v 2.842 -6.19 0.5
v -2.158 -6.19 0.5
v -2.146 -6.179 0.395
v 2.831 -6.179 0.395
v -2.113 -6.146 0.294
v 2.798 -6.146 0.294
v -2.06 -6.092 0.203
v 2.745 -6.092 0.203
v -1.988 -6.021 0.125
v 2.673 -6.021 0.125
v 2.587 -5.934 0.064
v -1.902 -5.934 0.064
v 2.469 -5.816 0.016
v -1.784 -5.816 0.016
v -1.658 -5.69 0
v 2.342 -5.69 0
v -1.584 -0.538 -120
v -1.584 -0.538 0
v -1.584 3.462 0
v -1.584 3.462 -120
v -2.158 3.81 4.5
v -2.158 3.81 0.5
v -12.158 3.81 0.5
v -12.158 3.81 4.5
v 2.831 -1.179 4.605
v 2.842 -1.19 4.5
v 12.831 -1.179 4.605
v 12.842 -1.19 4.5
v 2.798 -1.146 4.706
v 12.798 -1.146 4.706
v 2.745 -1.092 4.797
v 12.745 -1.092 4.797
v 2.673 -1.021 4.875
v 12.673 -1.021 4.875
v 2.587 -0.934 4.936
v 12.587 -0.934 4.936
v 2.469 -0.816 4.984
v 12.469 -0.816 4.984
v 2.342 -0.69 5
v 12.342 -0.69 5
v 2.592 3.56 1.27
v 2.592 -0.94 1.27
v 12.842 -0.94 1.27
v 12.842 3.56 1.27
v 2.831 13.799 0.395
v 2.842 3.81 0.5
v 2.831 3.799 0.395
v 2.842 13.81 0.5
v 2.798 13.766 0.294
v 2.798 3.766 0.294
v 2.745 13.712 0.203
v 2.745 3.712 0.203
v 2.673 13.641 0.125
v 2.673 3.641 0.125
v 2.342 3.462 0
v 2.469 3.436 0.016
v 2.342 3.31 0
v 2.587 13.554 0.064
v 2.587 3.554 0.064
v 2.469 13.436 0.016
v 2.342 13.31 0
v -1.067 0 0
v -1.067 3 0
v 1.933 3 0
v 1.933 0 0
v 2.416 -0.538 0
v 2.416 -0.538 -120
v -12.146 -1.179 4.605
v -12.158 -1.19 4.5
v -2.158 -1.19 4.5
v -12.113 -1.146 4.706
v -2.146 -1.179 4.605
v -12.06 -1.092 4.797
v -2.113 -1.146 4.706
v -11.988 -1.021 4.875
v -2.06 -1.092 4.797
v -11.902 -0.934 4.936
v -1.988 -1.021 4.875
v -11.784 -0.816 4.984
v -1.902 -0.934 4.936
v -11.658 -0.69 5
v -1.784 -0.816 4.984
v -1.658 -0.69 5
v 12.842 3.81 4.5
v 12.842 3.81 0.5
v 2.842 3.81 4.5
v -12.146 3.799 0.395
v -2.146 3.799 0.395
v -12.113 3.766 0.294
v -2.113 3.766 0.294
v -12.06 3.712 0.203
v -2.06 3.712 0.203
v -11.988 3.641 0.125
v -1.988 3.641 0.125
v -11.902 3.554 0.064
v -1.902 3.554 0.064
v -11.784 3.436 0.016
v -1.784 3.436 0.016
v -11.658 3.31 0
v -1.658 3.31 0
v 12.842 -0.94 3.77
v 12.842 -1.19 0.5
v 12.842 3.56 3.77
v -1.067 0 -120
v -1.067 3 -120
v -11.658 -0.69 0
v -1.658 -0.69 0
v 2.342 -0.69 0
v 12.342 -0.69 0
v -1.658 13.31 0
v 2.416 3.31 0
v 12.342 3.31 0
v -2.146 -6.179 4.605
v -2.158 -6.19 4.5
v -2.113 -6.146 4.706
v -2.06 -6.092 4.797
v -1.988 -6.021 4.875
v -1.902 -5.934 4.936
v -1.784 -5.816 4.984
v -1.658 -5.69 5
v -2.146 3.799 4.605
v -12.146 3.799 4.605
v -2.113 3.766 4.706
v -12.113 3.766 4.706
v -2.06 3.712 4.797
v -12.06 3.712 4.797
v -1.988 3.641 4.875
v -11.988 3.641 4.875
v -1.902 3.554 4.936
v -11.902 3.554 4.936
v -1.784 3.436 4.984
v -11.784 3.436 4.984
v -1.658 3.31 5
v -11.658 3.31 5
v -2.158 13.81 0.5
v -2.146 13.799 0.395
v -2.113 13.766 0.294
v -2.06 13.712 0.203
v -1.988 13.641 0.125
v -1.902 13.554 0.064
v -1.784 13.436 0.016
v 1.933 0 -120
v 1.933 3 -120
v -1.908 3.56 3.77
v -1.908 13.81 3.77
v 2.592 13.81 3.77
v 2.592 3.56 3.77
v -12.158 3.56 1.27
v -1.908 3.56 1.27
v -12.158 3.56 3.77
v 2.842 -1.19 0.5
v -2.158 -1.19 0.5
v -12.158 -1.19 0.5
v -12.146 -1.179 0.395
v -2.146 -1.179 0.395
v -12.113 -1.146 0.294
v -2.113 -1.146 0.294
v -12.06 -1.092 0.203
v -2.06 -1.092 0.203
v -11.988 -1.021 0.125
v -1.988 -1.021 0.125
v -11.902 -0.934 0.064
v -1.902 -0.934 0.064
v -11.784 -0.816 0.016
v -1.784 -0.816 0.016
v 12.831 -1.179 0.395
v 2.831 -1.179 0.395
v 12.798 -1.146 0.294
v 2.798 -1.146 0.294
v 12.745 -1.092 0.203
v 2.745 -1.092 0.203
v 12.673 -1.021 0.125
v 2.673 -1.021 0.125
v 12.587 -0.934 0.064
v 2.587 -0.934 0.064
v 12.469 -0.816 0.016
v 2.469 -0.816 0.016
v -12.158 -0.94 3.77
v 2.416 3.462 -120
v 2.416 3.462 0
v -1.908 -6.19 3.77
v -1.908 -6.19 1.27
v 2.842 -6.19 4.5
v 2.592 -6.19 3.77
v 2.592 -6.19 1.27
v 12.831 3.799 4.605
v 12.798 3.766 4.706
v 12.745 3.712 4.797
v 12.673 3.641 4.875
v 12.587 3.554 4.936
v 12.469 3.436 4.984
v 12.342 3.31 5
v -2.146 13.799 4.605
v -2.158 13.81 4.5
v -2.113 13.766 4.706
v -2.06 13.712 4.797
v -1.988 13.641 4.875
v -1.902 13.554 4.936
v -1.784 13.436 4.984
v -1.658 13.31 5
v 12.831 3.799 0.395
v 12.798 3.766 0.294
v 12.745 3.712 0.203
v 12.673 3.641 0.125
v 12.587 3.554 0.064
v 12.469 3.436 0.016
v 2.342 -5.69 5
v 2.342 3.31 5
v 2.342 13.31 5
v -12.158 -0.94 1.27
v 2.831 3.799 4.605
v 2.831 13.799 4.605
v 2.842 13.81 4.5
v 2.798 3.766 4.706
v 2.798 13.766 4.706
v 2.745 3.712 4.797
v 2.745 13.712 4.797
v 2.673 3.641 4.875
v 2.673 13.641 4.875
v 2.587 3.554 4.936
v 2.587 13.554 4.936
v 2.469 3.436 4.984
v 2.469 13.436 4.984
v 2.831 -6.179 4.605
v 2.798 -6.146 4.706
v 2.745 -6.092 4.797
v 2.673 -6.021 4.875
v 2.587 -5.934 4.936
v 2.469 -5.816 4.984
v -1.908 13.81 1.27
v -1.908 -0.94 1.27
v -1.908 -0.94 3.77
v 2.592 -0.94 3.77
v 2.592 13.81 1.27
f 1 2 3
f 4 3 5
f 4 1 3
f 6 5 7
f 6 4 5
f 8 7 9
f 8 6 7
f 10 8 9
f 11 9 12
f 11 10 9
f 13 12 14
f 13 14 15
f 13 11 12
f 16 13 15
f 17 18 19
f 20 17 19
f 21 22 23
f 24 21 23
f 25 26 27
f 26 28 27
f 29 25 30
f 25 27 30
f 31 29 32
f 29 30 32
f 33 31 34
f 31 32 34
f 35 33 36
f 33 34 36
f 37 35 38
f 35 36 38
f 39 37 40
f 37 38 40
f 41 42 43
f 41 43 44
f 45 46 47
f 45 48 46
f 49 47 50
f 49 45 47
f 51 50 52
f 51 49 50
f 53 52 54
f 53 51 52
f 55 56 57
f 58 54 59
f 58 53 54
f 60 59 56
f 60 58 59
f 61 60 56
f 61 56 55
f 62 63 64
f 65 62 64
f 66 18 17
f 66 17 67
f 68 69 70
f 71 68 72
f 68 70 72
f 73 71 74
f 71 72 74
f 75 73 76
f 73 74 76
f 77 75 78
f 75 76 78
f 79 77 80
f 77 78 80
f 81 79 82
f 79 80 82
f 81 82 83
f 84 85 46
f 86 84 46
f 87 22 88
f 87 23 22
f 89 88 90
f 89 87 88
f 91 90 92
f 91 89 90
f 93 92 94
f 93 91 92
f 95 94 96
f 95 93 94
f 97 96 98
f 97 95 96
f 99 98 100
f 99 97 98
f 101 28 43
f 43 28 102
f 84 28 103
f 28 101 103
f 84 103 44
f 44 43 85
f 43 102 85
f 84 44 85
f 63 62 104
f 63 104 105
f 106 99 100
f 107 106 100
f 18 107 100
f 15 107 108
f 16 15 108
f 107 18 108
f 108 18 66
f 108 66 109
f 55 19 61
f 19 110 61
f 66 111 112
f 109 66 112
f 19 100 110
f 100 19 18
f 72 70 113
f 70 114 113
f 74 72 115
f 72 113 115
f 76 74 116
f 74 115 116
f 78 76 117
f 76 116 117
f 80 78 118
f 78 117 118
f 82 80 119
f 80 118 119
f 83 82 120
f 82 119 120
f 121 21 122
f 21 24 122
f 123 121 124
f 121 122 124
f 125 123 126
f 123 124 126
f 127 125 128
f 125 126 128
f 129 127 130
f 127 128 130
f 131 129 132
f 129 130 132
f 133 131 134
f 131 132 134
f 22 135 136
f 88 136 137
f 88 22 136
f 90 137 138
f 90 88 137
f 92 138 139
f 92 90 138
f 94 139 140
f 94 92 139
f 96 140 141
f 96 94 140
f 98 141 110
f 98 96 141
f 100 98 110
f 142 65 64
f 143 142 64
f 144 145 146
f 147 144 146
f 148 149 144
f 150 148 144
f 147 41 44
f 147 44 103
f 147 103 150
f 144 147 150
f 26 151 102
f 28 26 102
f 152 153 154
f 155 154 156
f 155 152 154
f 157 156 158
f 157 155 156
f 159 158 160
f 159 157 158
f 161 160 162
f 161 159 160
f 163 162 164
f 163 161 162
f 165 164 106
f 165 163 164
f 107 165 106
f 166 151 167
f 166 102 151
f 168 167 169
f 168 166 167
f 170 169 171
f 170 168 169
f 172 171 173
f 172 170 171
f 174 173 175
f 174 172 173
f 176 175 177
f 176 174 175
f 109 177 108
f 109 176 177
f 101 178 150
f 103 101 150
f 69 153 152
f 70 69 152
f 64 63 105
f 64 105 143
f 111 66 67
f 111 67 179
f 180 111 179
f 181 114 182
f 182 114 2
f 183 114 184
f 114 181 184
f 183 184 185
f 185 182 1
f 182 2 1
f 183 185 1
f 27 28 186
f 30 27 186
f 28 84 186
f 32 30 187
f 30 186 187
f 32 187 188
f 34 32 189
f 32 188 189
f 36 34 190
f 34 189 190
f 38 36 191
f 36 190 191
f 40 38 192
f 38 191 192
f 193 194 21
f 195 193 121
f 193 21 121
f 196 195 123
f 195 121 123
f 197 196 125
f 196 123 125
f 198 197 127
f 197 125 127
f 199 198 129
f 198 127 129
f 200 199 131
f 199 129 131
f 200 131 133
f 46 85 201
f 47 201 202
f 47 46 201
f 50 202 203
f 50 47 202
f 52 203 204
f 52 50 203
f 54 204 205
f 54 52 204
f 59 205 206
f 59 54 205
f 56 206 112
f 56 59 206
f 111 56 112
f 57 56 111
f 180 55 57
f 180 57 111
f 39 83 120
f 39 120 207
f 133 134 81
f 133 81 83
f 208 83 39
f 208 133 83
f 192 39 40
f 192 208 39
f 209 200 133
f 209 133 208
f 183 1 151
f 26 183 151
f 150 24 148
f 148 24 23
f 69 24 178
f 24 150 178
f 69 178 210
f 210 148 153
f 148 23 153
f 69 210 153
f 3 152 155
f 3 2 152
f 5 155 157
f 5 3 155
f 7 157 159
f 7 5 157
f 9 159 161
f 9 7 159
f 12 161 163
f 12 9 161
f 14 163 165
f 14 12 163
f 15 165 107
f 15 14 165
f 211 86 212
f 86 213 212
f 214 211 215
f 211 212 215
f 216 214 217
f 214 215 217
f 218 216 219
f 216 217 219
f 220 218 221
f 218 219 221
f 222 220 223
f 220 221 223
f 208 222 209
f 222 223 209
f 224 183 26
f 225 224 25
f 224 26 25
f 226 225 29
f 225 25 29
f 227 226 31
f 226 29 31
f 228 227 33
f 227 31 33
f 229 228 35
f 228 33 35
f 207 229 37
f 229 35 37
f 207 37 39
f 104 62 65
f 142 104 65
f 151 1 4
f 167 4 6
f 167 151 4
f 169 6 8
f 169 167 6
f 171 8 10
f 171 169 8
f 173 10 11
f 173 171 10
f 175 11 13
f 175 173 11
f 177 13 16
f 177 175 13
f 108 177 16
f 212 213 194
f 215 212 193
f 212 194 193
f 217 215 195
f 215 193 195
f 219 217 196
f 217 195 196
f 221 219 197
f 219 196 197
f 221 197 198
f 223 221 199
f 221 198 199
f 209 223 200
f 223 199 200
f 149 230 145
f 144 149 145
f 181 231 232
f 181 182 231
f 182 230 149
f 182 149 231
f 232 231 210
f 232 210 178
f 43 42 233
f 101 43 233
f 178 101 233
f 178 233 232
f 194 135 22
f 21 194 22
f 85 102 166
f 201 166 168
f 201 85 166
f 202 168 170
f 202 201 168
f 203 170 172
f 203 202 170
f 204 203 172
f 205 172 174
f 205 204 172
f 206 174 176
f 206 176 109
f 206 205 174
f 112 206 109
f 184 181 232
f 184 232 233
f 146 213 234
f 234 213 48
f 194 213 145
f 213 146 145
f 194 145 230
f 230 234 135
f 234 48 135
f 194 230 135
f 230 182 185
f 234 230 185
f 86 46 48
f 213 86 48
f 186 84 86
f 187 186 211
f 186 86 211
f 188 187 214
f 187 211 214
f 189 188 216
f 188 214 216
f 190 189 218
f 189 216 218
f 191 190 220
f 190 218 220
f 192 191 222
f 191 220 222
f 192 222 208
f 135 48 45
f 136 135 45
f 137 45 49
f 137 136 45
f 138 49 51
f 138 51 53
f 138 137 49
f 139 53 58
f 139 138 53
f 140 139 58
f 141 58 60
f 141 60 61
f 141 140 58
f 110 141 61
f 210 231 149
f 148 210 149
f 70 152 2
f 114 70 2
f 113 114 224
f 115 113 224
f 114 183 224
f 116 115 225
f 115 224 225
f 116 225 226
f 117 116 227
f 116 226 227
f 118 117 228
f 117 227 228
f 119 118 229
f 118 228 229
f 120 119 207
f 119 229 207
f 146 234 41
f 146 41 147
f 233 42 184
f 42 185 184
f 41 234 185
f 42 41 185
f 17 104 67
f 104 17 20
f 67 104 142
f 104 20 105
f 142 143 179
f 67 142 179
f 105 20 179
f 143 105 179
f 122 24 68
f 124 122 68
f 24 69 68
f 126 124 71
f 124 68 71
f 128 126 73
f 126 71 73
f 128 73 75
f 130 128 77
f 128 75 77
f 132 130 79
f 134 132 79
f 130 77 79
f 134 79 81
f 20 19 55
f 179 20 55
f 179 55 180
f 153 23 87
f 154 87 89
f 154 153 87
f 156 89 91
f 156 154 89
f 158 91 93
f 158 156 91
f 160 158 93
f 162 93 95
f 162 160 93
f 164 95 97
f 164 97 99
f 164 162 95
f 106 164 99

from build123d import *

# Parameters (mm, degrees)
F1_DEPTH = 5
F2_R     = 0.5
F3_W     = 4.5
F3_H     = 2.5
F4_DEPTH = 25
F5_W     = 4.5
F5_H     = 2.5
F6_DEPTH = 25
F7_W     = 4
F7_H     = 4
F7_W_2   = 3
F7_H_2   = 3
F8_DEPTH = 120


with BuildPart() as f1:
    # F0 (on Top) → F1 (new body)
    with BuildSketch(Plane.XY):
        Polygon((-2.157534, 3.810042), (-12.157534, 3.810042), (-12.157534, -1.189958), (-2.157534, -1.189958), (-2.157534, -6.189958), (2.842466, -6.189958), (2.842466, -1.189958), (12.842466, -1.189958), (12.842466, 3.810042), (2.842466, 3.810042), (2.842466, 13.810042), (-2.157534, 13.810042), align=None)
    extrude(amount=F1_DEPTH)

    # F2
    f2_edges = [f1.edges().sort_by_distance(p)[0] for p in [
        (-2.157534, 8.810042, 5),
        (-7.157534, 3.810042, 5),
        (-12.157534, 1.310042, 5),
        (-7.157534, -1.189958, 5),
        (-2.157534, -3.689958, 5),
        (0.342466, -6.189958, 5),
        (2.842466, -3.689958, 5),
        (7.842466, -1.189958, 5),
        (12.842466, 1.310042, 5),
        (7.842466, 3.810042, 5),
        (2.842466, 8.810042, 5),
        (0.342466, 13.810042, 5),
        (-2.157534, 8.810042, 0),
        (-7.157534, 3.810042, 0),
        (-12.157534, 1.310042, 0),
        (-7.157534, -1.189958, 0),
        (-2.157534, -3.689958, 0),
        (0.342466, -6.189958, 0),
        (2.842466, -3.689958, 0),
        (7.842466, -1.189958, 0),
        (12.842466, 1.310042, 0),
        (7.842466, 3.810042, 0),
        (2.842466, 8.810042, 0),
        (0.342466, 13.810042, 0),
    ]]
    fillet(f2_edges, radius=F2_R)

    # F3 (on Right) → F4 (cut, symmetric)
    with BuildSketch(Plane.YZ):
        with Locations((1.310042, 2.520103)):
            Rectangle(F3_W, F3_H)
    extrude(amount=F4_DEPTH, both=True, mode=Mode.SUBTRACT)

    # F5 (on Front) → F6 (cut, symmetric)
    with BuildSketch(Plane.XZ):
        with Locations((0.342466, 2.519919)):
            Rectangle(F5_W, F5_H)
    extrude(amount=F6_DEPTH, both=True, mode=Mode.SUBTRACT)

    # F7 (on Top) → F8 (join)
    with BuildSketch(Plane.XY):
        with Locations((0.416273, 1.462451)):
            Rectangle(F7_W, F7_H)
        with Locations((0.432896, 1.5)):
            Rectangle(F7_W_2, F7_H_2, mode=Mode.SUBTRACT)
    extrude(amount=-F8_DEPTH)


solid = f1.part
